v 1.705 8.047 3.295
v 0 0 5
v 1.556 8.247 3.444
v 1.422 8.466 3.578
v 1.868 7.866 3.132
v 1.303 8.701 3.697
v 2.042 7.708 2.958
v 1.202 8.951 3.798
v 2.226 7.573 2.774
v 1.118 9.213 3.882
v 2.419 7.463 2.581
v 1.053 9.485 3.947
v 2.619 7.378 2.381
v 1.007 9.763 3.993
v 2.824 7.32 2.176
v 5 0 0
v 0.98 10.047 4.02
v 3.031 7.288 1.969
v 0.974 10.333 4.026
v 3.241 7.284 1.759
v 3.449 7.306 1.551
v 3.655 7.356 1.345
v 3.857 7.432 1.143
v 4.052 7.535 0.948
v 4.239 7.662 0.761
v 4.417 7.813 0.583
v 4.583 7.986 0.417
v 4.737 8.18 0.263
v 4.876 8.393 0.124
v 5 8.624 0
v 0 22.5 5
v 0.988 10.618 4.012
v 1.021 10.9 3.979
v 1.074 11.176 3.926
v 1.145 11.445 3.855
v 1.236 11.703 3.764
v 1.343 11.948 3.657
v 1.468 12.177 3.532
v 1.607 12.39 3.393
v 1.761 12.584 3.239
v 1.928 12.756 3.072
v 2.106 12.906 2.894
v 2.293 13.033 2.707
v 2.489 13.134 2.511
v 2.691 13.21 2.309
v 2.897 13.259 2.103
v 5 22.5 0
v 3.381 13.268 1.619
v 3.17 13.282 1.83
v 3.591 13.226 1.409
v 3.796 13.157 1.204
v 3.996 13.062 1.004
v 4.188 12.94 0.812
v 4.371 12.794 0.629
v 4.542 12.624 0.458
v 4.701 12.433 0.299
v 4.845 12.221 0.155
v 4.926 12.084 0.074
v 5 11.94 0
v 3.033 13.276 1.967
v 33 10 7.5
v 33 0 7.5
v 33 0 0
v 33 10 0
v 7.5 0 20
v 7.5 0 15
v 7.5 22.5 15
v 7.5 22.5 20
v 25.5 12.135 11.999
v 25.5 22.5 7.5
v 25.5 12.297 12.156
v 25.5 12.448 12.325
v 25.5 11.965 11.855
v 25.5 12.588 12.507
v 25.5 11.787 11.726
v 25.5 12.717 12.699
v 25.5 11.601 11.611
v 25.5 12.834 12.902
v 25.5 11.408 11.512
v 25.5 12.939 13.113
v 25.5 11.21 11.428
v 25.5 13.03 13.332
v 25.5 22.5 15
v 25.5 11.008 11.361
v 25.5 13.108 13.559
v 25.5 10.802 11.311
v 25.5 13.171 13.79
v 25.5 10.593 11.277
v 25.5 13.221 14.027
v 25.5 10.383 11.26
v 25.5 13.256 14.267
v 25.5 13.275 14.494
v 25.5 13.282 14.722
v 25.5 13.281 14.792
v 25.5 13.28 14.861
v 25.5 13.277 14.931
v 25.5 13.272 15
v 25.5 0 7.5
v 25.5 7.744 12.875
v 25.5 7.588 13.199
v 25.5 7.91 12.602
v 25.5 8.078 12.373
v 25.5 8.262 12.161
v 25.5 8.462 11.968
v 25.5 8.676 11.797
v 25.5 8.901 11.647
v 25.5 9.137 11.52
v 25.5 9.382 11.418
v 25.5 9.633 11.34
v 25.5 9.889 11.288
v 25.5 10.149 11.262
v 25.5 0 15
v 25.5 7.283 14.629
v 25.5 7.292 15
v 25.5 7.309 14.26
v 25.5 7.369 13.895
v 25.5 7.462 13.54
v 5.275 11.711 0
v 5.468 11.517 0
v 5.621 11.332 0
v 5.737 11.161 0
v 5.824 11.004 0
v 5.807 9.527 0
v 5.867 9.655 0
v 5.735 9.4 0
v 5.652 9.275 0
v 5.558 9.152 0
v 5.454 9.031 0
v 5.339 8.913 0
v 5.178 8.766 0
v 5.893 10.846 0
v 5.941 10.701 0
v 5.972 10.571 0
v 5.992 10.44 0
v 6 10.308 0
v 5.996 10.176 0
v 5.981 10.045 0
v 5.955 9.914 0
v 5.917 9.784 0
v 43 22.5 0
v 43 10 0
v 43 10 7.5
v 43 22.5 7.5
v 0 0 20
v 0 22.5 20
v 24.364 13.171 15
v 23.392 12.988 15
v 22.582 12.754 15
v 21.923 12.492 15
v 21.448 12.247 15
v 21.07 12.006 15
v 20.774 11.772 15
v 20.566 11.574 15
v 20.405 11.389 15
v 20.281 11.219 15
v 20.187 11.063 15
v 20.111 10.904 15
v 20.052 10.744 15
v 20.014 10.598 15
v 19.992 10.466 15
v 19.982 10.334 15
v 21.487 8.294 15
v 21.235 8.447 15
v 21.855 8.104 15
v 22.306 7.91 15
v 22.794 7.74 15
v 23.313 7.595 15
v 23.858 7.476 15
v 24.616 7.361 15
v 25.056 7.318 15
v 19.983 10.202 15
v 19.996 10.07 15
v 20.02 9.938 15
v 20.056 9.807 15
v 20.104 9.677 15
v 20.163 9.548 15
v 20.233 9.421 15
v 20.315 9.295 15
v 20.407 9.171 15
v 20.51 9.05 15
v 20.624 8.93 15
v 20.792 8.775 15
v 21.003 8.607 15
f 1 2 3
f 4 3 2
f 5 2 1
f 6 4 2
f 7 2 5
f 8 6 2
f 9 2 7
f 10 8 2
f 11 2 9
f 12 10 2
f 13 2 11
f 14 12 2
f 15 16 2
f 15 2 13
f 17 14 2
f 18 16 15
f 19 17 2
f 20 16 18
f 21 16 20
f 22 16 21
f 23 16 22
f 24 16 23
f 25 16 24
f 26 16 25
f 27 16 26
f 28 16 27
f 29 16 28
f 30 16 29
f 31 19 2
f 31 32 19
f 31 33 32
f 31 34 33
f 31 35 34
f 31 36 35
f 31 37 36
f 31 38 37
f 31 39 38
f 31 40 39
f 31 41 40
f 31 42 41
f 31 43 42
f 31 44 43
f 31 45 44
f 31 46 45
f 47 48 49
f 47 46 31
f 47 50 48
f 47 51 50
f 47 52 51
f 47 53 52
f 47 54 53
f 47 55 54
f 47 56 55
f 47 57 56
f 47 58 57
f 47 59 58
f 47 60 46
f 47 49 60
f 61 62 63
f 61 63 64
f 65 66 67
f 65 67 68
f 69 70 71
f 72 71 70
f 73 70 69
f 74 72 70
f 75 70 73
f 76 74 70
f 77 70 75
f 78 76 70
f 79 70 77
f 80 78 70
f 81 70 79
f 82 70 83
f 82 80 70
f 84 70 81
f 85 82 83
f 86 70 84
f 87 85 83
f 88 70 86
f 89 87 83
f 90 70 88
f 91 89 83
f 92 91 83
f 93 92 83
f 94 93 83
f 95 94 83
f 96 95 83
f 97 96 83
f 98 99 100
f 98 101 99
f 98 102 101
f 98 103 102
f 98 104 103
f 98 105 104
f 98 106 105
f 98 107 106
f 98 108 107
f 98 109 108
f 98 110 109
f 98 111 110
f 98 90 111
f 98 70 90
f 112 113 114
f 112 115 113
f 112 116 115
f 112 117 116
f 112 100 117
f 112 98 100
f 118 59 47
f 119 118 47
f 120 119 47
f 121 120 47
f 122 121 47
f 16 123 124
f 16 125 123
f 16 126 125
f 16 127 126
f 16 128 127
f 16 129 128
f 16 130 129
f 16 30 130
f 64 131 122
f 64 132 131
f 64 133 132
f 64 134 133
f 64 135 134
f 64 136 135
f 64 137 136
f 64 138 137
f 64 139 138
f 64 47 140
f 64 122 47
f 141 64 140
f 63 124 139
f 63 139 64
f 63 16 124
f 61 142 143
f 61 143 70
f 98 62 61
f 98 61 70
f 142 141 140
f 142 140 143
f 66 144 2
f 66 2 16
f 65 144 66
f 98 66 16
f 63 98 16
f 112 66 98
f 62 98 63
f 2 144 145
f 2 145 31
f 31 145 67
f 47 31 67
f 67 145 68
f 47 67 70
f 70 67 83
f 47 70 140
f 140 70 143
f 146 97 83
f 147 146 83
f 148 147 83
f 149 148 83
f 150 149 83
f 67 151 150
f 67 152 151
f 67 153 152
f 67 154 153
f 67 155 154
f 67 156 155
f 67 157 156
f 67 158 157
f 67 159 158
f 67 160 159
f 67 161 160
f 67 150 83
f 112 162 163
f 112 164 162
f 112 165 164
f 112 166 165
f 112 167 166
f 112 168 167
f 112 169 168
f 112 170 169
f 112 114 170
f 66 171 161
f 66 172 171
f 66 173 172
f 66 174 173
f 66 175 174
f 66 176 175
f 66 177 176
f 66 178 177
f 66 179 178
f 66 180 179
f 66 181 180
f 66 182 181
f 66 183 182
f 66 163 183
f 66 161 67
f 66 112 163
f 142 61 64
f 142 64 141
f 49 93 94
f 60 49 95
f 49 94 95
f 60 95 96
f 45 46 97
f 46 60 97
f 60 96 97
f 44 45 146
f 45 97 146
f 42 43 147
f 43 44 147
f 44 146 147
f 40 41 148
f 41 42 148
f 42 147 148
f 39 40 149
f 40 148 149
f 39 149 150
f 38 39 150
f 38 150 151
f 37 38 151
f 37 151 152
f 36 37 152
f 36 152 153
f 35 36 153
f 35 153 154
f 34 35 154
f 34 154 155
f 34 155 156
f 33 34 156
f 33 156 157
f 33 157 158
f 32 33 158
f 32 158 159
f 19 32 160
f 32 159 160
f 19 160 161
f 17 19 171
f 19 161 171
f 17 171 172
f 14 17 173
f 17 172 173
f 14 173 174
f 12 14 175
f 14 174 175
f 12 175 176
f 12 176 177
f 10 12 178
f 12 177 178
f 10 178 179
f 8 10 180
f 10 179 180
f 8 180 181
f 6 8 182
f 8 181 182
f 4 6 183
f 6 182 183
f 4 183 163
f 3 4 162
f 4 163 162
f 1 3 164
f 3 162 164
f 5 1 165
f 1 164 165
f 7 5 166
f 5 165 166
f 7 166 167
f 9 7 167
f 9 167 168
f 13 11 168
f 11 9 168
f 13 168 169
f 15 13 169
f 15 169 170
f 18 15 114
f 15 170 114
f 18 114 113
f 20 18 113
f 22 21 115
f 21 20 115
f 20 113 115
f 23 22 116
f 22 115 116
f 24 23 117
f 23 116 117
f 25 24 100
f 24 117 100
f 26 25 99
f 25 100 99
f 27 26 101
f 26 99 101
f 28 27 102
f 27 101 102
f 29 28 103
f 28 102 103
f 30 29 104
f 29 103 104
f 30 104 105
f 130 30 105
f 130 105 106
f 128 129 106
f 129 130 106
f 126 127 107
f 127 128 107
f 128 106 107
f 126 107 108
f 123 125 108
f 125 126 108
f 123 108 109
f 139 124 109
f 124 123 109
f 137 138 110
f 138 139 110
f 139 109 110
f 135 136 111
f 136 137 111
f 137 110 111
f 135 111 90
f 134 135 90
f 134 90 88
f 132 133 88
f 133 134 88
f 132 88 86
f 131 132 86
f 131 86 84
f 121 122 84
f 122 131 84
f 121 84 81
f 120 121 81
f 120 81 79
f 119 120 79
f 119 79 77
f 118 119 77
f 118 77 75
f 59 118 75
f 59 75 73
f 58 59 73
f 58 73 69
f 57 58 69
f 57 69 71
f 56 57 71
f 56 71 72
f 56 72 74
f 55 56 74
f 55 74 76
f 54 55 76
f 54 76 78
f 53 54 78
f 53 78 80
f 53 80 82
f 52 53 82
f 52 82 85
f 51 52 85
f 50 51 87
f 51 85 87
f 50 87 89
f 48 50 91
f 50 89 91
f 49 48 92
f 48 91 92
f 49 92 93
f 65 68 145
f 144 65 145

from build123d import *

# Parameters (mm, degrees)
F1_DEPTH = 22.5
F2_W     = 10
F2_H     = 10
F3_DEPTH = 7.5
F4_SIZE  = 5
F6_R     = 3
F7_DEPTH = 29.584648


with BuildPart() as f1:
    # F0 (on Front) → F1 (new body)
    with BuildSketch(Plane.XZ):
        Polygon((0, 20), (0, 0), (43, 0), (43, 7.5), (25.5, 7.5), (25.5, 15), (7.5, 15), (7.5, 20), align=None)
    extrude(amount=-F1_DEPTH)

    # F2 (on face) → F3 (cut, through all)
    with BuildSketch(Plane.XY.offset(7.5)):
        with Locations((38, 5)):
            Rectangle(F2_W, F2_H)
    extrude(amount=-F3_DEPTH, mode=Mode.SUBTRACT)

    # F4
    f4_edges = [f1.edges().sort_by_distance(p)[0] for p in [
        (0, 11.25, 0),
    ]]
    chamfer(f4_edges, length=F4_SIZE)

    # F6 (on face) → F7 (cut, through all)
    with BuildSketch(Plane(origin=(25.620191, 0, 14.791824), x_dir=(0, 1, 0), z_dir=(0.866025, 0, 0.5))):
        with Locations((10.281982, 0)):
            Circle(F6_R)
    extrude(amount=-F7_DEPTH, mode=Mode.SUBTRACT)


solid = f1.part
